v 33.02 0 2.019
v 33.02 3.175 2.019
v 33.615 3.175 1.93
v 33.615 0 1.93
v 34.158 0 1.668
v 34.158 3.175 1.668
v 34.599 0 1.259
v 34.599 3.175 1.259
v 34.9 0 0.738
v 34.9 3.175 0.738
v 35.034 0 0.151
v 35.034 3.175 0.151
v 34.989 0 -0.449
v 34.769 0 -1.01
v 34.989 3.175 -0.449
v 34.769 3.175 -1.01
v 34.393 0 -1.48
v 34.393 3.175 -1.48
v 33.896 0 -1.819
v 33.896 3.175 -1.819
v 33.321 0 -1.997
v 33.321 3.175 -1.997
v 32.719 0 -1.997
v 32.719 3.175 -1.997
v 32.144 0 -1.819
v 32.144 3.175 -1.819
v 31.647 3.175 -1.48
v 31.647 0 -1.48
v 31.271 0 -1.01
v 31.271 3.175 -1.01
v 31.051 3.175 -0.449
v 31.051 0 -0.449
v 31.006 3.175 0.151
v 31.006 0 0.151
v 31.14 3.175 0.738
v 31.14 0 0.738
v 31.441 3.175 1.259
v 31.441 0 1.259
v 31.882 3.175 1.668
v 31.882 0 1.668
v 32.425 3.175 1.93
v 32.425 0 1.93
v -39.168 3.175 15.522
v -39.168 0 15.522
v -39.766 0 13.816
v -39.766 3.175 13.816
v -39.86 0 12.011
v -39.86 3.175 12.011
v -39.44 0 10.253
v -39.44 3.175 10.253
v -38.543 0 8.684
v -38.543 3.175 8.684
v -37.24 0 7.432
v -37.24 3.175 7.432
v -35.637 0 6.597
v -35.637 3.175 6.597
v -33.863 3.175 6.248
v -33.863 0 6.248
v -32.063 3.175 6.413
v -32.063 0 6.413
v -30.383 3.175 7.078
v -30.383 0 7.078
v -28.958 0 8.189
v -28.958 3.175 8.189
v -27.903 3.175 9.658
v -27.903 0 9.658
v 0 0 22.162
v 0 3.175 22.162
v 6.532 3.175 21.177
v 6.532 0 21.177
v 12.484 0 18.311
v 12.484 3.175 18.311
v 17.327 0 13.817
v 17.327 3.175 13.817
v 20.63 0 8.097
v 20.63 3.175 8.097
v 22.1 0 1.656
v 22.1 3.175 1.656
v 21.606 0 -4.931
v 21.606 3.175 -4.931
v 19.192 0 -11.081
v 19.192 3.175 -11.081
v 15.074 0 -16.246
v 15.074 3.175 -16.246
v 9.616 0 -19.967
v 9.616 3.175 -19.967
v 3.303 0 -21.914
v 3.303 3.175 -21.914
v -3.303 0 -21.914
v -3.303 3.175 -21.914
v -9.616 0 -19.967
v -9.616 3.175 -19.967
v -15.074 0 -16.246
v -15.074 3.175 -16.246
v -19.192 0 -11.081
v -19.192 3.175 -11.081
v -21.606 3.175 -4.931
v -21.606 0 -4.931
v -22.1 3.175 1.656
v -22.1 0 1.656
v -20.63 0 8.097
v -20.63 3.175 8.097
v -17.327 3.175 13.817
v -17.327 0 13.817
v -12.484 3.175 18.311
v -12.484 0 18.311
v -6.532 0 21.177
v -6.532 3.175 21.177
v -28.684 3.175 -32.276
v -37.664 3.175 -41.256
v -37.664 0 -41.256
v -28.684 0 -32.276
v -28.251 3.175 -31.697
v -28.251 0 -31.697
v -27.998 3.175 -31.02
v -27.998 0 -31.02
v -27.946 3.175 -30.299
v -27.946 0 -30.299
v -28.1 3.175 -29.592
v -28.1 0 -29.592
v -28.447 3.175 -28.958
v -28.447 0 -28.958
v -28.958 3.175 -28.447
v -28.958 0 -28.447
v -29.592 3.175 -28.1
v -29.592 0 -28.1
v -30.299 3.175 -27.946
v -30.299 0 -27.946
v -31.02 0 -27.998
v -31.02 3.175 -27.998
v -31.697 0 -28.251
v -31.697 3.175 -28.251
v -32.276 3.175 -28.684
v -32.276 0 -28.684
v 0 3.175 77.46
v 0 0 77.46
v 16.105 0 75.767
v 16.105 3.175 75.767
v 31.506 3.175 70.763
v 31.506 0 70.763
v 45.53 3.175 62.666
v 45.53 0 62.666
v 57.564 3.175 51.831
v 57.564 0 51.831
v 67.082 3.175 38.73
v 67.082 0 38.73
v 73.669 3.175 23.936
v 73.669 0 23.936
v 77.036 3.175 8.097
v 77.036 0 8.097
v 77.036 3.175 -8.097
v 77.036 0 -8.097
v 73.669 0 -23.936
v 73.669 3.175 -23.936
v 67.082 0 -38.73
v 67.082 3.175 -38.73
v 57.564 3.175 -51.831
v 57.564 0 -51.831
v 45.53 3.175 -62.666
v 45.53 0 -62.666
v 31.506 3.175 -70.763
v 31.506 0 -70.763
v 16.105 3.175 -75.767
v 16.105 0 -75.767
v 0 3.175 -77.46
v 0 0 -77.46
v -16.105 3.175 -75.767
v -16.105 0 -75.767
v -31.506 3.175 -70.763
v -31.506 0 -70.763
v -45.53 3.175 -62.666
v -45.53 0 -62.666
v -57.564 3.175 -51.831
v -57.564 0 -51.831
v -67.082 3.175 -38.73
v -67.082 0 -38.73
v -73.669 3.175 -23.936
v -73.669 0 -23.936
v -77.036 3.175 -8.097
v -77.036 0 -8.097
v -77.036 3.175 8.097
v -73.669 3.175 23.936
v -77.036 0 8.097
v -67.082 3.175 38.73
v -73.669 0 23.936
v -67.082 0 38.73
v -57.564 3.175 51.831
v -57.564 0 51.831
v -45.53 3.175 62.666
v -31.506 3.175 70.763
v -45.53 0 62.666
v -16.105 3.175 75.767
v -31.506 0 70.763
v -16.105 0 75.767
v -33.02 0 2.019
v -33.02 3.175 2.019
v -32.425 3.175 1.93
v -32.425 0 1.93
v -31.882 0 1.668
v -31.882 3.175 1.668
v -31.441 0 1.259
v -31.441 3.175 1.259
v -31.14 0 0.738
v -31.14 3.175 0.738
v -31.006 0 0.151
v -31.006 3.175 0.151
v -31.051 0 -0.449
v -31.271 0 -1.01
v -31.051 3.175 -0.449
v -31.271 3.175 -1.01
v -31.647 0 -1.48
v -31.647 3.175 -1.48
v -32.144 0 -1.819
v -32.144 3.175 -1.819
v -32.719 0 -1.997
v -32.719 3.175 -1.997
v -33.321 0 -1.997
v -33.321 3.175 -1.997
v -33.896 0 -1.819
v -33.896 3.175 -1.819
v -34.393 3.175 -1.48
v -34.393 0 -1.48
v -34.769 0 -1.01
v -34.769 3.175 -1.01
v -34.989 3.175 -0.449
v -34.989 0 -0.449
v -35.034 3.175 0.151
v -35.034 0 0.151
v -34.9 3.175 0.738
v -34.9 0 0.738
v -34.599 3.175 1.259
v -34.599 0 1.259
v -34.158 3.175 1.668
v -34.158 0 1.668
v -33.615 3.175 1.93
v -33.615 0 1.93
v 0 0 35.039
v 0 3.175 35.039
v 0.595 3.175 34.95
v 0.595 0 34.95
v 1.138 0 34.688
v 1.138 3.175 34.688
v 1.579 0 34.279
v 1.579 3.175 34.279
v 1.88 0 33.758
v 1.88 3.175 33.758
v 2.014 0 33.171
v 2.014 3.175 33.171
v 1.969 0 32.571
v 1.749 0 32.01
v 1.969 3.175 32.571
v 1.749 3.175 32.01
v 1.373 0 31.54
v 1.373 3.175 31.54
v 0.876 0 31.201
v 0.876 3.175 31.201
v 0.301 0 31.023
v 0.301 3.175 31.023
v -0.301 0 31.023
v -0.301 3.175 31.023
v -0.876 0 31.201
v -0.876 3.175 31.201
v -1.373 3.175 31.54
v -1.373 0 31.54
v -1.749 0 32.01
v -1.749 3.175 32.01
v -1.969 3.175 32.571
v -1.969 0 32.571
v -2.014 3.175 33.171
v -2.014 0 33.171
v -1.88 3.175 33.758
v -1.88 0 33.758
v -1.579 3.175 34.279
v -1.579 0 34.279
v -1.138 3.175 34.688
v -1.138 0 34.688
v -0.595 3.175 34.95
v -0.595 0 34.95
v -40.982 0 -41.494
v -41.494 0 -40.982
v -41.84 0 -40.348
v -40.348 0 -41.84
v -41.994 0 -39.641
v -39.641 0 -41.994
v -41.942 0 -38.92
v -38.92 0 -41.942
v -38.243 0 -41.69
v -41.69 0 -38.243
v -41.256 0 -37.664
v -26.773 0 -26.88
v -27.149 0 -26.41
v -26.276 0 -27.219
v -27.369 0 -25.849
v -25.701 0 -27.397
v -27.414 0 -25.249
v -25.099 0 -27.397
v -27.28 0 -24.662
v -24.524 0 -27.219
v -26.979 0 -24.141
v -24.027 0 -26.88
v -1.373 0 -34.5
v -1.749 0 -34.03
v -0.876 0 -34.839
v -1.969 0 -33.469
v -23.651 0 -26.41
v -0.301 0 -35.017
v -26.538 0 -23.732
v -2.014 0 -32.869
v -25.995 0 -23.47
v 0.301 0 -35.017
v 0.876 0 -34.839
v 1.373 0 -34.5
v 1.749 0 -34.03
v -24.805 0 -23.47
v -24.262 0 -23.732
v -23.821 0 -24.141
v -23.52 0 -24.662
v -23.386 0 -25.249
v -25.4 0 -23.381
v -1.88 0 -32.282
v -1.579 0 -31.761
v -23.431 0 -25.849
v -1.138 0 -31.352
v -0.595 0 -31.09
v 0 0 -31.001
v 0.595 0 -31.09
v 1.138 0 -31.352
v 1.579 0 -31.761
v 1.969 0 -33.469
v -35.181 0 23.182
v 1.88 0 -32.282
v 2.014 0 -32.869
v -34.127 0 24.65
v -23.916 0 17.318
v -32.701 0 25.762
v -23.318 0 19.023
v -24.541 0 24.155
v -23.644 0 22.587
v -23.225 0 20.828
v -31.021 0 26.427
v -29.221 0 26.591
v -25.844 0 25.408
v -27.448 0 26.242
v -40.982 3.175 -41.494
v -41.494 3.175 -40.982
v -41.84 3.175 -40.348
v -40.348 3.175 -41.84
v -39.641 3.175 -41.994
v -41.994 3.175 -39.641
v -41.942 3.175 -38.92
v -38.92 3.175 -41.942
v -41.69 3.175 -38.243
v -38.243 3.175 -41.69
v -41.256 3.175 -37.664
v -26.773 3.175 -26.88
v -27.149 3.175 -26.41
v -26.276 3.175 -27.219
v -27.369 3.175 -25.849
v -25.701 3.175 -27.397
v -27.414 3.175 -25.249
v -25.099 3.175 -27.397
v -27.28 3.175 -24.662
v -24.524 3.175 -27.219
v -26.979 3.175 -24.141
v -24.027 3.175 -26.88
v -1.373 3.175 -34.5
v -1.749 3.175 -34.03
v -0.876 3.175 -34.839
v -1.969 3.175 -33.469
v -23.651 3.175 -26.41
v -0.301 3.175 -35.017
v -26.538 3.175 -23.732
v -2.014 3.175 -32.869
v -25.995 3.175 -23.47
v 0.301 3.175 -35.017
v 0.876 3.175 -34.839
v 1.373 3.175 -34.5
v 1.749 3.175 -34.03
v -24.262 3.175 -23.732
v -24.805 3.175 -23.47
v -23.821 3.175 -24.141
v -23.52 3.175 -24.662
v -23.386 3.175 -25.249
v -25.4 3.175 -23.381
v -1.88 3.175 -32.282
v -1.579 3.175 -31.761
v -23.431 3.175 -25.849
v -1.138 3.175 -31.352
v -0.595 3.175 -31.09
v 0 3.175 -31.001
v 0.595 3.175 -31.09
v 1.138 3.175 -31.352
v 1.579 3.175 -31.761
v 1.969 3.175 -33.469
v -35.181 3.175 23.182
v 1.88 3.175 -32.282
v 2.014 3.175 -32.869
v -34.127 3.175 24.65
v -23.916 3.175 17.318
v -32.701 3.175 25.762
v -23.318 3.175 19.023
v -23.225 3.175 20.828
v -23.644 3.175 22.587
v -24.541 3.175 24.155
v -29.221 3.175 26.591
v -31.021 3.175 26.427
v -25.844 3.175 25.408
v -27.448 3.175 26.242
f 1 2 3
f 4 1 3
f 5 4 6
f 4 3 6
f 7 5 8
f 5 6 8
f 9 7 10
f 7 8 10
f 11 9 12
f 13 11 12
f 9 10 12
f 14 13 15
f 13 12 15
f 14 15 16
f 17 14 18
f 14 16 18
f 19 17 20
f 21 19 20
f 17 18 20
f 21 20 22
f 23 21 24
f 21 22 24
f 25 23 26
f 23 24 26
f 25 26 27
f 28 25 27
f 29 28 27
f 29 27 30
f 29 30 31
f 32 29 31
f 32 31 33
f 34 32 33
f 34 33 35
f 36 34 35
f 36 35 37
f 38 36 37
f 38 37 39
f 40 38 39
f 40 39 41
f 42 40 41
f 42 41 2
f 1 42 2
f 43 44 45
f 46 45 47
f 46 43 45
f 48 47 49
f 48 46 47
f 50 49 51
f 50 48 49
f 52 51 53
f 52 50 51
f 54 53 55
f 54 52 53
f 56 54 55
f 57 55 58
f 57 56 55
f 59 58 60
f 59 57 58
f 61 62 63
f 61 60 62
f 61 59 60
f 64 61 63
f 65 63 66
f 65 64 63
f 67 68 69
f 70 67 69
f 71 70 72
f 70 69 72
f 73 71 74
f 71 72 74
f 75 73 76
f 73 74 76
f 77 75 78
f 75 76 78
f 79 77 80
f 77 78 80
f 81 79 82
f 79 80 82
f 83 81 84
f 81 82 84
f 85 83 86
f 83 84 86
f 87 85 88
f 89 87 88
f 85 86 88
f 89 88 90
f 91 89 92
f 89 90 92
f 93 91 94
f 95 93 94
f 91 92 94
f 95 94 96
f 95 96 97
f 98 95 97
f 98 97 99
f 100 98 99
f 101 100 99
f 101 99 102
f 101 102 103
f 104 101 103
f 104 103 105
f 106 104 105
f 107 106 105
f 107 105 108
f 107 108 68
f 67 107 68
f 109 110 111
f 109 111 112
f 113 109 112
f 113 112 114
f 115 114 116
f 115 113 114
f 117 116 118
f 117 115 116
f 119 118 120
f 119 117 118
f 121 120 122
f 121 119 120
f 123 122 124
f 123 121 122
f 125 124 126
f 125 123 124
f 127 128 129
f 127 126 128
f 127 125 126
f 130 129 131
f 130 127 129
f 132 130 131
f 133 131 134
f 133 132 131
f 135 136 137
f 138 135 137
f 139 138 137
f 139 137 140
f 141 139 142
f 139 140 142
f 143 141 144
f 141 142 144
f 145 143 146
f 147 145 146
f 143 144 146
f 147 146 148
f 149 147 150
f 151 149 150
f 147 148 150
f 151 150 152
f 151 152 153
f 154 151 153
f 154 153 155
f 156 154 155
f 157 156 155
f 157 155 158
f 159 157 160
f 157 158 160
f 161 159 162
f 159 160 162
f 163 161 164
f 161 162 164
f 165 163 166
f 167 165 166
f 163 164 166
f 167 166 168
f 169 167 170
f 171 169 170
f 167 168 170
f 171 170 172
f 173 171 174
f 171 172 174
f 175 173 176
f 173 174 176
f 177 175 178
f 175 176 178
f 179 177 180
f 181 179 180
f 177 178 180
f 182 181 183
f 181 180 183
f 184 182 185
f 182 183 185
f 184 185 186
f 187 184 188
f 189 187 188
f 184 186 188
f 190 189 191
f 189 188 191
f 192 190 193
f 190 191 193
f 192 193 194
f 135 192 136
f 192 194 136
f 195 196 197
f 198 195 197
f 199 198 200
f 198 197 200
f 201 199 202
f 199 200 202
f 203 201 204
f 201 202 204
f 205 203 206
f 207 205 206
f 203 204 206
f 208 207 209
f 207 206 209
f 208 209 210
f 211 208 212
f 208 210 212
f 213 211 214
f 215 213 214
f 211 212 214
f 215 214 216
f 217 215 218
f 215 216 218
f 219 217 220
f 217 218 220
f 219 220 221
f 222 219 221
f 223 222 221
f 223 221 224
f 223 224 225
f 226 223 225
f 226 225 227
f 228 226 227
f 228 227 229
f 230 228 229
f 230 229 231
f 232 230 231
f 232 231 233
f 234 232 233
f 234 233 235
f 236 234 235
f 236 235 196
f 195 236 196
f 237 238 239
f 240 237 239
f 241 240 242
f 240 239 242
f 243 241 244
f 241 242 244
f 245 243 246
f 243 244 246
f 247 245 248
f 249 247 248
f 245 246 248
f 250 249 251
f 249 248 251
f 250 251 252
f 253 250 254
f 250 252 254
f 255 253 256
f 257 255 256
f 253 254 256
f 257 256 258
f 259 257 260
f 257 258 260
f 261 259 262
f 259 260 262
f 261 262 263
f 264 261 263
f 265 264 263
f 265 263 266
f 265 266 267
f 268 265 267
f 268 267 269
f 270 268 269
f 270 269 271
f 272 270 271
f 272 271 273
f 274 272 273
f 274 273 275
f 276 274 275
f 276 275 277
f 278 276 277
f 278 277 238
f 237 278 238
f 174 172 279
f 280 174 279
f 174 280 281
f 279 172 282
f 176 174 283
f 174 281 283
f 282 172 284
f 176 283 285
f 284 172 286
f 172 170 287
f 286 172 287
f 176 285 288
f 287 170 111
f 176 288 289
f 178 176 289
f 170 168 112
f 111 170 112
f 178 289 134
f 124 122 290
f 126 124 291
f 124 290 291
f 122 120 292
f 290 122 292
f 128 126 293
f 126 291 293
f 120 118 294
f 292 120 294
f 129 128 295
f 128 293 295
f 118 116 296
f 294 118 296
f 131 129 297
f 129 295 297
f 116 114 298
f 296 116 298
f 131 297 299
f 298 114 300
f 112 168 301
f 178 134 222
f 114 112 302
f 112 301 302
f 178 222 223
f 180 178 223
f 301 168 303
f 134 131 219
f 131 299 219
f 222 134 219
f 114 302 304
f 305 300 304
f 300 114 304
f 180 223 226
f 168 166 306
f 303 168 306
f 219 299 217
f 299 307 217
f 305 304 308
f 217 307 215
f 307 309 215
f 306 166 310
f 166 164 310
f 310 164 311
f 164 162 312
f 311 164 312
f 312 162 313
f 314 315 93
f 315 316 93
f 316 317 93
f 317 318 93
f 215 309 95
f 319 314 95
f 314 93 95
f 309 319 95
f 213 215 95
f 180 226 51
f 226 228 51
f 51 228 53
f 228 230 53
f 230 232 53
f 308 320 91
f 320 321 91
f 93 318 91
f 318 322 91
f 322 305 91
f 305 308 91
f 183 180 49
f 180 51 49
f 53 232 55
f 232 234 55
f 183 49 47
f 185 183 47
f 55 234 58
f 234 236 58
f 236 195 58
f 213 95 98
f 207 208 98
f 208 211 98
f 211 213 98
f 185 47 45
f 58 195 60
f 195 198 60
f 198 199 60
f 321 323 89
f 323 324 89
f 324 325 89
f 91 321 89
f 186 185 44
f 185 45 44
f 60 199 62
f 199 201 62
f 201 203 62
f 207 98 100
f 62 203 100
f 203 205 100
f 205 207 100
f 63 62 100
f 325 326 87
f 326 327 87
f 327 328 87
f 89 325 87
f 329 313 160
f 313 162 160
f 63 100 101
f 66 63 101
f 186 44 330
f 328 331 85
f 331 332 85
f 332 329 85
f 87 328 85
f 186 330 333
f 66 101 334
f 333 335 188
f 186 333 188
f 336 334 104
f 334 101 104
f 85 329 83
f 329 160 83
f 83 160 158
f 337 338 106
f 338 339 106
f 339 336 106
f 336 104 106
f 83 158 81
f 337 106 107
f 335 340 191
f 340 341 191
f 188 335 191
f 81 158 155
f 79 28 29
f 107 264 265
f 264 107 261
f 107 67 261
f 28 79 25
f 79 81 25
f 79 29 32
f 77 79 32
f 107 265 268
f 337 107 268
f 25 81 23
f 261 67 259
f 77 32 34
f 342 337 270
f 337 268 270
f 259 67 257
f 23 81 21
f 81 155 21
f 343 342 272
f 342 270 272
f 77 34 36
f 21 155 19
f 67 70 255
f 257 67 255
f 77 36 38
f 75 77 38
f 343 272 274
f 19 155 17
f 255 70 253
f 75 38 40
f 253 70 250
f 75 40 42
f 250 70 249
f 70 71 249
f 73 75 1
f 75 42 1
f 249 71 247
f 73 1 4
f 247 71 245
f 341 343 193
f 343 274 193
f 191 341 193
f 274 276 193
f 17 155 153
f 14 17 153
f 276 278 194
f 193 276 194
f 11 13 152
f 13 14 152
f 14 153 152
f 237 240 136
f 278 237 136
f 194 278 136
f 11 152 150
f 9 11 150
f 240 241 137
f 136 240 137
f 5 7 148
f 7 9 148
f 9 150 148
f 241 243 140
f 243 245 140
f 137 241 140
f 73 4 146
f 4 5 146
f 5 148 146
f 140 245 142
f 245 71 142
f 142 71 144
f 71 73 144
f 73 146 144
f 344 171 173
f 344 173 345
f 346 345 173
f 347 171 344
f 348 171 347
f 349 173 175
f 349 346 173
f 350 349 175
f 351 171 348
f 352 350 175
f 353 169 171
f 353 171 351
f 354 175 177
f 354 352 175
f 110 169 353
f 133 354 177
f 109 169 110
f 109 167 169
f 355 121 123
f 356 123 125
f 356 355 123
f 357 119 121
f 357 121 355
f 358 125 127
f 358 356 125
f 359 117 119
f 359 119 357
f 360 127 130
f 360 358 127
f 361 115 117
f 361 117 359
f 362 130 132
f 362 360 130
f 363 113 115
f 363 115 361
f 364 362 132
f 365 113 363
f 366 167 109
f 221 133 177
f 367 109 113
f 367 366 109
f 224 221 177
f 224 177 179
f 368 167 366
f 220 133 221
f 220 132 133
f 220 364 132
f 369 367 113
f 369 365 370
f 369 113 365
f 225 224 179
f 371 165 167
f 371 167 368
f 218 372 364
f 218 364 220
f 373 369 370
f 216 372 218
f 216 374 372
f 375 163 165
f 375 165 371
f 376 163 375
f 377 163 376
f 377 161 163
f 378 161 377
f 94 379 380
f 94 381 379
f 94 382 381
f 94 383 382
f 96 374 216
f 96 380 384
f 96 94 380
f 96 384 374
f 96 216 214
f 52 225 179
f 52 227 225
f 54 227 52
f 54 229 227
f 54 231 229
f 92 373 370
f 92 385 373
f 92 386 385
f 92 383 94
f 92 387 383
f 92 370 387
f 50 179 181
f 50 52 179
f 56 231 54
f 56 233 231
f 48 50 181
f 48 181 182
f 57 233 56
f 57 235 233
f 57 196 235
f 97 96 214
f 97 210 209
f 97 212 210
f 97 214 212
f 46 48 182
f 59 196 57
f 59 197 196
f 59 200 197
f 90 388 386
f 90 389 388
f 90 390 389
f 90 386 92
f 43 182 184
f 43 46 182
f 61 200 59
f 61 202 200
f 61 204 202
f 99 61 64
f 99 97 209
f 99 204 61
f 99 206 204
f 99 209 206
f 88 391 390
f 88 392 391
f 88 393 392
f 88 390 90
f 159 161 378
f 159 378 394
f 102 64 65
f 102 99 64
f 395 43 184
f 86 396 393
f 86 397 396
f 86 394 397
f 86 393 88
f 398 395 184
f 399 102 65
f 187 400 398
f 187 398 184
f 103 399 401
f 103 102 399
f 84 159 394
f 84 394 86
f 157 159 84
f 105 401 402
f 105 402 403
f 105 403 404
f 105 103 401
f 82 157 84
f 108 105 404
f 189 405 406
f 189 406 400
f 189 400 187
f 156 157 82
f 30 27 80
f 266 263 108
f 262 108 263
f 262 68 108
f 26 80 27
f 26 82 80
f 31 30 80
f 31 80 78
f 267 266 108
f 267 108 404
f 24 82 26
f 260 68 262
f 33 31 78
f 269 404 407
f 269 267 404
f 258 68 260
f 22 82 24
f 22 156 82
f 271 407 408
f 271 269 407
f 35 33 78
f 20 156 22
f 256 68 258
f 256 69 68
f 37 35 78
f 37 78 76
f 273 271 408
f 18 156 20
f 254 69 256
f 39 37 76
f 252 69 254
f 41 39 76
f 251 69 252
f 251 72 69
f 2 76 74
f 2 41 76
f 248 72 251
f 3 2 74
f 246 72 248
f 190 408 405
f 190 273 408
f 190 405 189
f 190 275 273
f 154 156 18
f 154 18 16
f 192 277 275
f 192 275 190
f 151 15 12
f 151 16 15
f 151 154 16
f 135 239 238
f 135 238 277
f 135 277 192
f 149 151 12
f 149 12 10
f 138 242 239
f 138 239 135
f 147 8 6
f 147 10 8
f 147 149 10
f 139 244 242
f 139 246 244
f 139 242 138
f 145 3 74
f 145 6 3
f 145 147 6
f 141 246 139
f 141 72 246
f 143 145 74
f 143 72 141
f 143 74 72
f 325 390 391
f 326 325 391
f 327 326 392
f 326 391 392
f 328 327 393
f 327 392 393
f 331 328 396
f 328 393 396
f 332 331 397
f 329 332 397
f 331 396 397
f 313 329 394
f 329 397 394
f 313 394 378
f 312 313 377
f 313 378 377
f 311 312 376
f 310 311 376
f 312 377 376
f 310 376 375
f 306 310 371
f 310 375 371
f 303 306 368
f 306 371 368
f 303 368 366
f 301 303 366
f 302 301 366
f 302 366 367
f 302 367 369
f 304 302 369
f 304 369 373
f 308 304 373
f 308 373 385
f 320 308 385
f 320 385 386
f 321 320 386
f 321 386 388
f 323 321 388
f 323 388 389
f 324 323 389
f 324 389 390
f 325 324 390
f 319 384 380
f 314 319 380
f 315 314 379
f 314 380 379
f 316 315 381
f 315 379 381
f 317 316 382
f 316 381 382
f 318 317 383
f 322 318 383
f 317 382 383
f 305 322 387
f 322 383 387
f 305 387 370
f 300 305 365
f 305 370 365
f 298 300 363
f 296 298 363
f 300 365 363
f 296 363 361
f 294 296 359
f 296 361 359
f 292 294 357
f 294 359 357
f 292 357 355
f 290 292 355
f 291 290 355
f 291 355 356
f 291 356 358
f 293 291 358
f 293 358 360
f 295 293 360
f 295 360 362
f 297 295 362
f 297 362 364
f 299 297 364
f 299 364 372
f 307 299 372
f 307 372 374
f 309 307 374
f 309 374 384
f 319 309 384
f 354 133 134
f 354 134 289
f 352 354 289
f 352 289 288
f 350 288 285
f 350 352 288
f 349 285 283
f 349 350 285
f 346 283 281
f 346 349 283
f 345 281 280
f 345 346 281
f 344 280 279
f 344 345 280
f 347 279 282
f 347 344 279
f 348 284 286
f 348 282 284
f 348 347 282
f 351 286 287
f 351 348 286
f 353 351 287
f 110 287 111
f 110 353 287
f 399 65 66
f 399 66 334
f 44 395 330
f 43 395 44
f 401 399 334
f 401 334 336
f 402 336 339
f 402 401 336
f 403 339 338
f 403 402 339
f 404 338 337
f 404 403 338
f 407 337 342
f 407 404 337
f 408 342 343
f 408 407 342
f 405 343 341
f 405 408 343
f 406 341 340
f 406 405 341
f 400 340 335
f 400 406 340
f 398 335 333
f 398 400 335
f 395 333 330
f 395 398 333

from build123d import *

# Parameters (mm, degrees)
SKETCH1_R           = 77.4600051
BOSS_EXTRUDE1_DEPTH = 3.175
SKETCH24_R          = 22.1615
SKETCH24_R_2        = 2.0193
CUT_EXTRUDE14_DEPTH = 110.590991442


with BuildPart() as part:
    # Sketch1 → Boss-Extrude1 (new body)
    with BuildSketch(Plane(origin=(0, 0, 0), x_dir=(1, 0, 0), z_dir=(0, 1, 0))):
        with Locations(Location((0, 0, 0), (0, 0, 270))):
            Circle(SKETCH1_R)
    extrude(amount=BOSS_EXTRUDE1_DEPTH)

    # Sketch24 → Cut-Extrude14 (cut, through all)
    with BuildSketch(Plane(origin=(0, 3.175, 0), x_dir=(1, 0, 0), z_dir=(0, 1, 0))):
        with Locations(Location((0, 0, 0), (0, 0, 270))):
            Circle(SKETCH24_R)
        with Locations(Location((-25.4, 25.4, 0), (0, 0, 270))):
            Circle(SKETCH24_R_2)
        with Locations(Location((0, 33.02, 0), (0, 0, 270))):
            Circle(SKETCH24_R_2)
        with Locations(Location((33.02, 0, 0), (0, 0, 270))):
            Circle(SKETCH24_R_2)
        with Locations(Location((0, -33.02, 0), (0, 0, 270))):
            Circle(SKETCH24_R_2)
        with Locations(Location((-33.02, 0, 0), (0, 0, 270))):
            Circle(SKETCH24_R_2)
        with BuildLine():
            Line((-32.276051224, 28.683948776), (-41.256307345, 37.664204897))
            ThreePointArc((-41.256307345, 37.664204897), (-41.256307345, 41.256307345), (-37.664204897, 41.256307345))
            Line((-37.664204897, 41.256307345), (-28.683948776, 32.276051224))
            ThreePointArc((-28.683948776, 32.276051224), (-28.683948776, 28.683948776), (-32.276051224, 28.683948776))
        make_face()
        with BuildLine():
            Line((-27.903416949, -9.657564215), (-23.915755925, -17.31778977))
            ThreePointArc((-23.915755925, -17.31778977), (-26.616171022, -25.882412255), (-35.180793507, -23.181997158))
            Line((-35.180793507, -23.181997158), (-39.16845453, -15.521771603))
            ThreePointArc((-39.16845453, -15.521771603), (-36.468039434, -6.957149118), (-27.903416949, -9.657564215))
        make_face()
    extrude(amount=-CUT_EXTRUDE14_DEPTH, mode=Mode.SUBTRACT)


solid = part.part
